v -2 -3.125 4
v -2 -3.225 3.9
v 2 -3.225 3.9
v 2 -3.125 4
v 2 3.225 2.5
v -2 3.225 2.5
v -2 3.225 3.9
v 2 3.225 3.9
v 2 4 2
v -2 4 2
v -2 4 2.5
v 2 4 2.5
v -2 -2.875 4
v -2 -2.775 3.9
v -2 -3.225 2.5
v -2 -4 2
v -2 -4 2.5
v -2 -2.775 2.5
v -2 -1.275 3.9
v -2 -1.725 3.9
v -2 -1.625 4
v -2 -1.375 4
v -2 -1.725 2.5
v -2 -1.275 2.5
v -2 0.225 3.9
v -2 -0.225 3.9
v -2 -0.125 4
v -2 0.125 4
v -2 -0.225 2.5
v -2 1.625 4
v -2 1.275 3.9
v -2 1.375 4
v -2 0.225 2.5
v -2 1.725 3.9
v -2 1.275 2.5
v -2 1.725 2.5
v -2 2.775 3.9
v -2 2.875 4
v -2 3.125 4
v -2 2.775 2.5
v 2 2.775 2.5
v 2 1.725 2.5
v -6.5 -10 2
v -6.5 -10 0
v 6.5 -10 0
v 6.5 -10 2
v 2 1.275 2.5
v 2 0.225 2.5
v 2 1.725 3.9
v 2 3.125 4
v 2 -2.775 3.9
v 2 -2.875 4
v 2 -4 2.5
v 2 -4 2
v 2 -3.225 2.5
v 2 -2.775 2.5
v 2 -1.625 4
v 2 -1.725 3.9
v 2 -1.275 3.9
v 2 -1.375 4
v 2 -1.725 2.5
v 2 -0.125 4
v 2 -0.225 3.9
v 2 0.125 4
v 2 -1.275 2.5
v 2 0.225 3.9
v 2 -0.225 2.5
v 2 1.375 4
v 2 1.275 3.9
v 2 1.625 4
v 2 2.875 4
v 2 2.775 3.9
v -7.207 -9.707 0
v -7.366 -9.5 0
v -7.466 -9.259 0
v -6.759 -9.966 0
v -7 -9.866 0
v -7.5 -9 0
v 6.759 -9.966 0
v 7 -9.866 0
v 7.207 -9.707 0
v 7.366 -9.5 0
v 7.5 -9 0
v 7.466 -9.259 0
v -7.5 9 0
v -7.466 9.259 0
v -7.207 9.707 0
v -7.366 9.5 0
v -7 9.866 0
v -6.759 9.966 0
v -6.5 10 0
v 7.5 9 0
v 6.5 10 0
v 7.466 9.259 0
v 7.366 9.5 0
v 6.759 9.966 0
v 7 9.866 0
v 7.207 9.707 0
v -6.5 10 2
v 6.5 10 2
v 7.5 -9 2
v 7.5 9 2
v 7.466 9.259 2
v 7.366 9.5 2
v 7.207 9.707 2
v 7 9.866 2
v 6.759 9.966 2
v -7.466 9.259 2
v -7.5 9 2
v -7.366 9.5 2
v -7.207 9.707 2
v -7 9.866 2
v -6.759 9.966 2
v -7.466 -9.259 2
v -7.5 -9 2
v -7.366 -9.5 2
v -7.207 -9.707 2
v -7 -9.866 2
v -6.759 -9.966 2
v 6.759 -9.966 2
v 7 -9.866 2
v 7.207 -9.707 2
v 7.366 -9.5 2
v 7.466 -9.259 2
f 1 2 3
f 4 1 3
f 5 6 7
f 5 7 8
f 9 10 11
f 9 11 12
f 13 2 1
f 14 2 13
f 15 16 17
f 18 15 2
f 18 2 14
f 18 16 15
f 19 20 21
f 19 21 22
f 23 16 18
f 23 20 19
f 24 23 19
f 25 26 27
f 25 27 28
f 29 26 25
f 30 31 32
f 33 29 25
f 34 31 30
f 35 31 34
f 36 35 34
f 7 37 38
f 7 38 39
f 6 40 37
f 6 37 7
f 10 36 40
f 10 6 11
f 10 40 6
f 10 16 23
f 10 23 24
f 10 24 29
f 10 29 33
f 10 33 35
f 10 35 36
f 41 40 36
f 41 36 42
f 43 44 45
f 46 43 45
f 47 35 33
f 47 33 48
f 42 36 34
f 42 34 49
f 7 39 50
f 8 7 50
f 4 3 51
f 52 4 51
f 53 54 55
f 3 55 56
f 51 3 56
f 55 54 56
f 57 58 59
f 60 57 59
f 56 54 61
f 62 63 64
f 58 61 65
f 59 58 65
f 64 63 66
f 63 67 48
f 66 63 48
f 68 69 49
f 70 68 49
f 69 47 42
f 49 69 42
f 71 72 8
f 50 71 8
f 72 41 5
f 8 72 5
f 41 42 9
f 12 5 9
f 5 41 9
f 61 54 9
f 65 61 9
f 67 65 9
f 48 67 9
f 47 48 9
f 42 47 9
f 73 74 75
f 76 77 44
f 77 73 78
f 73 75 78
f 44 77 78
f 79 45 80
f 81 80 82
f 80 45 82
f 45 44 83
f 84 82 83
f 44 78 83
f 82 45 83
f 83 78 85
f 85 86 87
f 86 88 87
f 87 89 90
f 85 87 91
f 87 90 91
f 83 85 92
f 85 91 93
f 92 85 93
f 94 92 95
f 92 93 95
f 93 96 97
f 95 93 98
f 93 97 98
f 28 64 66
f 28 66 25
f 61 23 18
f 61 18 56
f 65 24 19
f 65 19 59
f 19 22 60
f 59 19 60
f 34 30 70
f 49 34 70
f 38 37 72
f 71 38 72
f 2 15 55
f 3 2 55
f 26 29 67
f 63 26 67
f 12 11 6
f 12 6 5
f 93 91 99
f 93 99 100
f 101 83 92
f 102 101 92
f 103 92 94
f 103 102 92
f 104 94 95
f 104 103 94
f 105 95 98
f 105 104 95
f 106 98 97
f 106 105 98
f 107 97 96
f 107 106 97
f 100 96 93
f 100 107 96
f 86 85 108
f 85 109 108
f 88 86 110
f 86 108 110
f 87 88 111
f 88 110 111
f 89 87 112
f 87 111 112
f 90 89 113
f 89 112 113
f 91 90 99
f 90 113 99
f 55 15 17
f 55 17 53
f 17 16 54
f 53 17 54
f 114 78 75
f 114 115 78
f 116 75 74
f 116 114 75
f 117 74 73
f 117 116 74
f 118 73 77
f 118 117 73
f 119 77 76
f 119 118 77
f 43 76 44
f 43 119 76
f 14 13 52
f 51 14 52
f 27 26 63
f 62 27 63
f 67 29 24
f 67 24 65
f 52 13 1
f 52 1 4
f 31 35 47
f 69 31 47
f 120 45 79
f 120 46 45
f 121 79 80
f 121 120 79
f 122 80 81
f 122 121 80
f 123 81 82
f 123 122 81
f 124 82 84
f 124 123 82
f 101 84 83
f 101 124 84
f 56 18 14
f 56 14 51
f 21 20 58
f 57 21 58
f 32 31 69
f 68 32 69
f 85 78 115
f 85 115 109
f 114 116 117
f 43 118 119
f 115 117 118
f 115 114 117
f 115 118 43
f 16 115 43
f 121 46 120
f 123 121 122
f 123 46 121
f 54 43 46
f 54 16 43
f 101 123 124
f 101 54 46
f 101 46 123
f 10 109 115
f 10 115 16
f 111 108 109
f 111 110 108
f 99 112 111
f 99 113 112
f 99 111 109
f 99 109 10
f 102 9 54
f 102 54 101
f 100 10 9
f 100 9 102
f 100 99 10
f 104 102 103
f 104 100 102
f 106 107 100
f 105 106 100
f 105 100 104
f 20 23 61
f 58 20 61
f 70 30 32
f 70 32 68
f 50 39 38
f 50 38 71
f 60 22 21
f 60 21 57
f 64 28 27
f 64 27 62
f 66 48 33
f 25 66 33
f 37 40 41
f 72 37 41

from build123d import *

# Parameters (mm, degrees)
F0_W     = 15
F0_H     = 20
F1_DEPTH = 2
F0_W_2   = 4
F0_H_2   = 0.775
F0_H_3   = 1.05
F2_DEPTH = 2.5
F0_H_4   = 0.45
F3_DEPTH = 4
F4_SIZE  = 0.1
F5_R     = 1


with BuildPart() as f1:
    # F0 (on Top) → F1 (new body)
    with BuildSketch(Plane.XY):
        Rectangle(F0_W, F0_H)
        Polygon((2, -3.225), (2, -4), (-2, -4), (-2, -3.225), (-2, -2.775), (-2, -1.725), (-2, -1.275), (-2, -0.225), (-2, 0), (-2, 0.107463), (-2, 0.225), (-2, 1.275), (-2, 1.725), (-2, 2.775), (-2, 3.225), (-2, 4), (2, 4), (2, 3.225), (2, 2.775), (2, 1.725), (2, 1.275), (2, 0.225), (2, -0.225), (2, -1.275), (2, -1.725), (2, -2.775), align=None, mode=Mode.SUBTRACT)
    extrude(amount=F1_DEPTH)

    # F0 (on Top) → F2 (join)
    with BuildSketch(Plane.XY):
        with Locations((0, 3.6125)):
            Rectangle(F0_W_2, F0_H_2)
        with Locations((0, 0.75)):
            Rectangle(F0_W_2, F0_H_3)
        with Locations((0, -0.75)):
            Rectangle(F0_W_2, F0_H_3)
        with Locations((0, -3.6125)):
            Rectangle(F0_W_2, F0_H_2)
        with Locations((0, 2.25)):
            Rectangle(F0_W_2, F0_H_3)
        with Locations((0, -2.25)):
            Rectangle(F0_W_2, F0_H_3)
    extrude(amount=F2_DEPTH)

    # F0 (on Top) → F3 (join)
    with BuildSketch(Plane.XY):
        with Locations((0, 1.5)):
            Rectangle(F0_W_2, F0_H_4)
        Polygon((-2, -0.225), (2, -0.225), (2, 0.225), (-2, 0.225), (-2, 0.107463), (-2, 0), align=None)
        with Locations((0, -1.5)):
            Rectangle(F0_W_2, F0_H_4)
        with Locations((0, 3)):
            Rectangle(F0_W_2, F0_H_4)
        with Locations((0, -3)):
            Rectangle(F0_W_2, F0_H_4)
    extrude(amount=F3_DEPTH)

    # F4
    f4_edges = [f1.edges().sort_by_distance(p)[0] for p in [
        (0, -1.725, 4),
        (0, -1.275, 4),
        (0, -0.225, 4),
        (0, 0.225, 4),
        (0, 1.275, 4),
        (0, 1.725, 4),
        (0, 2.775, 4),
        (0, 3.225, 4),
        (0, -3.225, 4),
        (0, -2.775, 4),
    ]]
    chamfer(f4_edges, length=F4_SIZE)

    # F5
    f5_edges = [f1.edges().sort_by_distance(p)[0] for p in [
        (7.5, 10, 1),
        (7.5, -10, 1),
        (-7.5, -10, 1),
        (-7.5, 10, 1),
    ]]
    fillet(f5_edges, radius=F5_R)


solid = f1.part
